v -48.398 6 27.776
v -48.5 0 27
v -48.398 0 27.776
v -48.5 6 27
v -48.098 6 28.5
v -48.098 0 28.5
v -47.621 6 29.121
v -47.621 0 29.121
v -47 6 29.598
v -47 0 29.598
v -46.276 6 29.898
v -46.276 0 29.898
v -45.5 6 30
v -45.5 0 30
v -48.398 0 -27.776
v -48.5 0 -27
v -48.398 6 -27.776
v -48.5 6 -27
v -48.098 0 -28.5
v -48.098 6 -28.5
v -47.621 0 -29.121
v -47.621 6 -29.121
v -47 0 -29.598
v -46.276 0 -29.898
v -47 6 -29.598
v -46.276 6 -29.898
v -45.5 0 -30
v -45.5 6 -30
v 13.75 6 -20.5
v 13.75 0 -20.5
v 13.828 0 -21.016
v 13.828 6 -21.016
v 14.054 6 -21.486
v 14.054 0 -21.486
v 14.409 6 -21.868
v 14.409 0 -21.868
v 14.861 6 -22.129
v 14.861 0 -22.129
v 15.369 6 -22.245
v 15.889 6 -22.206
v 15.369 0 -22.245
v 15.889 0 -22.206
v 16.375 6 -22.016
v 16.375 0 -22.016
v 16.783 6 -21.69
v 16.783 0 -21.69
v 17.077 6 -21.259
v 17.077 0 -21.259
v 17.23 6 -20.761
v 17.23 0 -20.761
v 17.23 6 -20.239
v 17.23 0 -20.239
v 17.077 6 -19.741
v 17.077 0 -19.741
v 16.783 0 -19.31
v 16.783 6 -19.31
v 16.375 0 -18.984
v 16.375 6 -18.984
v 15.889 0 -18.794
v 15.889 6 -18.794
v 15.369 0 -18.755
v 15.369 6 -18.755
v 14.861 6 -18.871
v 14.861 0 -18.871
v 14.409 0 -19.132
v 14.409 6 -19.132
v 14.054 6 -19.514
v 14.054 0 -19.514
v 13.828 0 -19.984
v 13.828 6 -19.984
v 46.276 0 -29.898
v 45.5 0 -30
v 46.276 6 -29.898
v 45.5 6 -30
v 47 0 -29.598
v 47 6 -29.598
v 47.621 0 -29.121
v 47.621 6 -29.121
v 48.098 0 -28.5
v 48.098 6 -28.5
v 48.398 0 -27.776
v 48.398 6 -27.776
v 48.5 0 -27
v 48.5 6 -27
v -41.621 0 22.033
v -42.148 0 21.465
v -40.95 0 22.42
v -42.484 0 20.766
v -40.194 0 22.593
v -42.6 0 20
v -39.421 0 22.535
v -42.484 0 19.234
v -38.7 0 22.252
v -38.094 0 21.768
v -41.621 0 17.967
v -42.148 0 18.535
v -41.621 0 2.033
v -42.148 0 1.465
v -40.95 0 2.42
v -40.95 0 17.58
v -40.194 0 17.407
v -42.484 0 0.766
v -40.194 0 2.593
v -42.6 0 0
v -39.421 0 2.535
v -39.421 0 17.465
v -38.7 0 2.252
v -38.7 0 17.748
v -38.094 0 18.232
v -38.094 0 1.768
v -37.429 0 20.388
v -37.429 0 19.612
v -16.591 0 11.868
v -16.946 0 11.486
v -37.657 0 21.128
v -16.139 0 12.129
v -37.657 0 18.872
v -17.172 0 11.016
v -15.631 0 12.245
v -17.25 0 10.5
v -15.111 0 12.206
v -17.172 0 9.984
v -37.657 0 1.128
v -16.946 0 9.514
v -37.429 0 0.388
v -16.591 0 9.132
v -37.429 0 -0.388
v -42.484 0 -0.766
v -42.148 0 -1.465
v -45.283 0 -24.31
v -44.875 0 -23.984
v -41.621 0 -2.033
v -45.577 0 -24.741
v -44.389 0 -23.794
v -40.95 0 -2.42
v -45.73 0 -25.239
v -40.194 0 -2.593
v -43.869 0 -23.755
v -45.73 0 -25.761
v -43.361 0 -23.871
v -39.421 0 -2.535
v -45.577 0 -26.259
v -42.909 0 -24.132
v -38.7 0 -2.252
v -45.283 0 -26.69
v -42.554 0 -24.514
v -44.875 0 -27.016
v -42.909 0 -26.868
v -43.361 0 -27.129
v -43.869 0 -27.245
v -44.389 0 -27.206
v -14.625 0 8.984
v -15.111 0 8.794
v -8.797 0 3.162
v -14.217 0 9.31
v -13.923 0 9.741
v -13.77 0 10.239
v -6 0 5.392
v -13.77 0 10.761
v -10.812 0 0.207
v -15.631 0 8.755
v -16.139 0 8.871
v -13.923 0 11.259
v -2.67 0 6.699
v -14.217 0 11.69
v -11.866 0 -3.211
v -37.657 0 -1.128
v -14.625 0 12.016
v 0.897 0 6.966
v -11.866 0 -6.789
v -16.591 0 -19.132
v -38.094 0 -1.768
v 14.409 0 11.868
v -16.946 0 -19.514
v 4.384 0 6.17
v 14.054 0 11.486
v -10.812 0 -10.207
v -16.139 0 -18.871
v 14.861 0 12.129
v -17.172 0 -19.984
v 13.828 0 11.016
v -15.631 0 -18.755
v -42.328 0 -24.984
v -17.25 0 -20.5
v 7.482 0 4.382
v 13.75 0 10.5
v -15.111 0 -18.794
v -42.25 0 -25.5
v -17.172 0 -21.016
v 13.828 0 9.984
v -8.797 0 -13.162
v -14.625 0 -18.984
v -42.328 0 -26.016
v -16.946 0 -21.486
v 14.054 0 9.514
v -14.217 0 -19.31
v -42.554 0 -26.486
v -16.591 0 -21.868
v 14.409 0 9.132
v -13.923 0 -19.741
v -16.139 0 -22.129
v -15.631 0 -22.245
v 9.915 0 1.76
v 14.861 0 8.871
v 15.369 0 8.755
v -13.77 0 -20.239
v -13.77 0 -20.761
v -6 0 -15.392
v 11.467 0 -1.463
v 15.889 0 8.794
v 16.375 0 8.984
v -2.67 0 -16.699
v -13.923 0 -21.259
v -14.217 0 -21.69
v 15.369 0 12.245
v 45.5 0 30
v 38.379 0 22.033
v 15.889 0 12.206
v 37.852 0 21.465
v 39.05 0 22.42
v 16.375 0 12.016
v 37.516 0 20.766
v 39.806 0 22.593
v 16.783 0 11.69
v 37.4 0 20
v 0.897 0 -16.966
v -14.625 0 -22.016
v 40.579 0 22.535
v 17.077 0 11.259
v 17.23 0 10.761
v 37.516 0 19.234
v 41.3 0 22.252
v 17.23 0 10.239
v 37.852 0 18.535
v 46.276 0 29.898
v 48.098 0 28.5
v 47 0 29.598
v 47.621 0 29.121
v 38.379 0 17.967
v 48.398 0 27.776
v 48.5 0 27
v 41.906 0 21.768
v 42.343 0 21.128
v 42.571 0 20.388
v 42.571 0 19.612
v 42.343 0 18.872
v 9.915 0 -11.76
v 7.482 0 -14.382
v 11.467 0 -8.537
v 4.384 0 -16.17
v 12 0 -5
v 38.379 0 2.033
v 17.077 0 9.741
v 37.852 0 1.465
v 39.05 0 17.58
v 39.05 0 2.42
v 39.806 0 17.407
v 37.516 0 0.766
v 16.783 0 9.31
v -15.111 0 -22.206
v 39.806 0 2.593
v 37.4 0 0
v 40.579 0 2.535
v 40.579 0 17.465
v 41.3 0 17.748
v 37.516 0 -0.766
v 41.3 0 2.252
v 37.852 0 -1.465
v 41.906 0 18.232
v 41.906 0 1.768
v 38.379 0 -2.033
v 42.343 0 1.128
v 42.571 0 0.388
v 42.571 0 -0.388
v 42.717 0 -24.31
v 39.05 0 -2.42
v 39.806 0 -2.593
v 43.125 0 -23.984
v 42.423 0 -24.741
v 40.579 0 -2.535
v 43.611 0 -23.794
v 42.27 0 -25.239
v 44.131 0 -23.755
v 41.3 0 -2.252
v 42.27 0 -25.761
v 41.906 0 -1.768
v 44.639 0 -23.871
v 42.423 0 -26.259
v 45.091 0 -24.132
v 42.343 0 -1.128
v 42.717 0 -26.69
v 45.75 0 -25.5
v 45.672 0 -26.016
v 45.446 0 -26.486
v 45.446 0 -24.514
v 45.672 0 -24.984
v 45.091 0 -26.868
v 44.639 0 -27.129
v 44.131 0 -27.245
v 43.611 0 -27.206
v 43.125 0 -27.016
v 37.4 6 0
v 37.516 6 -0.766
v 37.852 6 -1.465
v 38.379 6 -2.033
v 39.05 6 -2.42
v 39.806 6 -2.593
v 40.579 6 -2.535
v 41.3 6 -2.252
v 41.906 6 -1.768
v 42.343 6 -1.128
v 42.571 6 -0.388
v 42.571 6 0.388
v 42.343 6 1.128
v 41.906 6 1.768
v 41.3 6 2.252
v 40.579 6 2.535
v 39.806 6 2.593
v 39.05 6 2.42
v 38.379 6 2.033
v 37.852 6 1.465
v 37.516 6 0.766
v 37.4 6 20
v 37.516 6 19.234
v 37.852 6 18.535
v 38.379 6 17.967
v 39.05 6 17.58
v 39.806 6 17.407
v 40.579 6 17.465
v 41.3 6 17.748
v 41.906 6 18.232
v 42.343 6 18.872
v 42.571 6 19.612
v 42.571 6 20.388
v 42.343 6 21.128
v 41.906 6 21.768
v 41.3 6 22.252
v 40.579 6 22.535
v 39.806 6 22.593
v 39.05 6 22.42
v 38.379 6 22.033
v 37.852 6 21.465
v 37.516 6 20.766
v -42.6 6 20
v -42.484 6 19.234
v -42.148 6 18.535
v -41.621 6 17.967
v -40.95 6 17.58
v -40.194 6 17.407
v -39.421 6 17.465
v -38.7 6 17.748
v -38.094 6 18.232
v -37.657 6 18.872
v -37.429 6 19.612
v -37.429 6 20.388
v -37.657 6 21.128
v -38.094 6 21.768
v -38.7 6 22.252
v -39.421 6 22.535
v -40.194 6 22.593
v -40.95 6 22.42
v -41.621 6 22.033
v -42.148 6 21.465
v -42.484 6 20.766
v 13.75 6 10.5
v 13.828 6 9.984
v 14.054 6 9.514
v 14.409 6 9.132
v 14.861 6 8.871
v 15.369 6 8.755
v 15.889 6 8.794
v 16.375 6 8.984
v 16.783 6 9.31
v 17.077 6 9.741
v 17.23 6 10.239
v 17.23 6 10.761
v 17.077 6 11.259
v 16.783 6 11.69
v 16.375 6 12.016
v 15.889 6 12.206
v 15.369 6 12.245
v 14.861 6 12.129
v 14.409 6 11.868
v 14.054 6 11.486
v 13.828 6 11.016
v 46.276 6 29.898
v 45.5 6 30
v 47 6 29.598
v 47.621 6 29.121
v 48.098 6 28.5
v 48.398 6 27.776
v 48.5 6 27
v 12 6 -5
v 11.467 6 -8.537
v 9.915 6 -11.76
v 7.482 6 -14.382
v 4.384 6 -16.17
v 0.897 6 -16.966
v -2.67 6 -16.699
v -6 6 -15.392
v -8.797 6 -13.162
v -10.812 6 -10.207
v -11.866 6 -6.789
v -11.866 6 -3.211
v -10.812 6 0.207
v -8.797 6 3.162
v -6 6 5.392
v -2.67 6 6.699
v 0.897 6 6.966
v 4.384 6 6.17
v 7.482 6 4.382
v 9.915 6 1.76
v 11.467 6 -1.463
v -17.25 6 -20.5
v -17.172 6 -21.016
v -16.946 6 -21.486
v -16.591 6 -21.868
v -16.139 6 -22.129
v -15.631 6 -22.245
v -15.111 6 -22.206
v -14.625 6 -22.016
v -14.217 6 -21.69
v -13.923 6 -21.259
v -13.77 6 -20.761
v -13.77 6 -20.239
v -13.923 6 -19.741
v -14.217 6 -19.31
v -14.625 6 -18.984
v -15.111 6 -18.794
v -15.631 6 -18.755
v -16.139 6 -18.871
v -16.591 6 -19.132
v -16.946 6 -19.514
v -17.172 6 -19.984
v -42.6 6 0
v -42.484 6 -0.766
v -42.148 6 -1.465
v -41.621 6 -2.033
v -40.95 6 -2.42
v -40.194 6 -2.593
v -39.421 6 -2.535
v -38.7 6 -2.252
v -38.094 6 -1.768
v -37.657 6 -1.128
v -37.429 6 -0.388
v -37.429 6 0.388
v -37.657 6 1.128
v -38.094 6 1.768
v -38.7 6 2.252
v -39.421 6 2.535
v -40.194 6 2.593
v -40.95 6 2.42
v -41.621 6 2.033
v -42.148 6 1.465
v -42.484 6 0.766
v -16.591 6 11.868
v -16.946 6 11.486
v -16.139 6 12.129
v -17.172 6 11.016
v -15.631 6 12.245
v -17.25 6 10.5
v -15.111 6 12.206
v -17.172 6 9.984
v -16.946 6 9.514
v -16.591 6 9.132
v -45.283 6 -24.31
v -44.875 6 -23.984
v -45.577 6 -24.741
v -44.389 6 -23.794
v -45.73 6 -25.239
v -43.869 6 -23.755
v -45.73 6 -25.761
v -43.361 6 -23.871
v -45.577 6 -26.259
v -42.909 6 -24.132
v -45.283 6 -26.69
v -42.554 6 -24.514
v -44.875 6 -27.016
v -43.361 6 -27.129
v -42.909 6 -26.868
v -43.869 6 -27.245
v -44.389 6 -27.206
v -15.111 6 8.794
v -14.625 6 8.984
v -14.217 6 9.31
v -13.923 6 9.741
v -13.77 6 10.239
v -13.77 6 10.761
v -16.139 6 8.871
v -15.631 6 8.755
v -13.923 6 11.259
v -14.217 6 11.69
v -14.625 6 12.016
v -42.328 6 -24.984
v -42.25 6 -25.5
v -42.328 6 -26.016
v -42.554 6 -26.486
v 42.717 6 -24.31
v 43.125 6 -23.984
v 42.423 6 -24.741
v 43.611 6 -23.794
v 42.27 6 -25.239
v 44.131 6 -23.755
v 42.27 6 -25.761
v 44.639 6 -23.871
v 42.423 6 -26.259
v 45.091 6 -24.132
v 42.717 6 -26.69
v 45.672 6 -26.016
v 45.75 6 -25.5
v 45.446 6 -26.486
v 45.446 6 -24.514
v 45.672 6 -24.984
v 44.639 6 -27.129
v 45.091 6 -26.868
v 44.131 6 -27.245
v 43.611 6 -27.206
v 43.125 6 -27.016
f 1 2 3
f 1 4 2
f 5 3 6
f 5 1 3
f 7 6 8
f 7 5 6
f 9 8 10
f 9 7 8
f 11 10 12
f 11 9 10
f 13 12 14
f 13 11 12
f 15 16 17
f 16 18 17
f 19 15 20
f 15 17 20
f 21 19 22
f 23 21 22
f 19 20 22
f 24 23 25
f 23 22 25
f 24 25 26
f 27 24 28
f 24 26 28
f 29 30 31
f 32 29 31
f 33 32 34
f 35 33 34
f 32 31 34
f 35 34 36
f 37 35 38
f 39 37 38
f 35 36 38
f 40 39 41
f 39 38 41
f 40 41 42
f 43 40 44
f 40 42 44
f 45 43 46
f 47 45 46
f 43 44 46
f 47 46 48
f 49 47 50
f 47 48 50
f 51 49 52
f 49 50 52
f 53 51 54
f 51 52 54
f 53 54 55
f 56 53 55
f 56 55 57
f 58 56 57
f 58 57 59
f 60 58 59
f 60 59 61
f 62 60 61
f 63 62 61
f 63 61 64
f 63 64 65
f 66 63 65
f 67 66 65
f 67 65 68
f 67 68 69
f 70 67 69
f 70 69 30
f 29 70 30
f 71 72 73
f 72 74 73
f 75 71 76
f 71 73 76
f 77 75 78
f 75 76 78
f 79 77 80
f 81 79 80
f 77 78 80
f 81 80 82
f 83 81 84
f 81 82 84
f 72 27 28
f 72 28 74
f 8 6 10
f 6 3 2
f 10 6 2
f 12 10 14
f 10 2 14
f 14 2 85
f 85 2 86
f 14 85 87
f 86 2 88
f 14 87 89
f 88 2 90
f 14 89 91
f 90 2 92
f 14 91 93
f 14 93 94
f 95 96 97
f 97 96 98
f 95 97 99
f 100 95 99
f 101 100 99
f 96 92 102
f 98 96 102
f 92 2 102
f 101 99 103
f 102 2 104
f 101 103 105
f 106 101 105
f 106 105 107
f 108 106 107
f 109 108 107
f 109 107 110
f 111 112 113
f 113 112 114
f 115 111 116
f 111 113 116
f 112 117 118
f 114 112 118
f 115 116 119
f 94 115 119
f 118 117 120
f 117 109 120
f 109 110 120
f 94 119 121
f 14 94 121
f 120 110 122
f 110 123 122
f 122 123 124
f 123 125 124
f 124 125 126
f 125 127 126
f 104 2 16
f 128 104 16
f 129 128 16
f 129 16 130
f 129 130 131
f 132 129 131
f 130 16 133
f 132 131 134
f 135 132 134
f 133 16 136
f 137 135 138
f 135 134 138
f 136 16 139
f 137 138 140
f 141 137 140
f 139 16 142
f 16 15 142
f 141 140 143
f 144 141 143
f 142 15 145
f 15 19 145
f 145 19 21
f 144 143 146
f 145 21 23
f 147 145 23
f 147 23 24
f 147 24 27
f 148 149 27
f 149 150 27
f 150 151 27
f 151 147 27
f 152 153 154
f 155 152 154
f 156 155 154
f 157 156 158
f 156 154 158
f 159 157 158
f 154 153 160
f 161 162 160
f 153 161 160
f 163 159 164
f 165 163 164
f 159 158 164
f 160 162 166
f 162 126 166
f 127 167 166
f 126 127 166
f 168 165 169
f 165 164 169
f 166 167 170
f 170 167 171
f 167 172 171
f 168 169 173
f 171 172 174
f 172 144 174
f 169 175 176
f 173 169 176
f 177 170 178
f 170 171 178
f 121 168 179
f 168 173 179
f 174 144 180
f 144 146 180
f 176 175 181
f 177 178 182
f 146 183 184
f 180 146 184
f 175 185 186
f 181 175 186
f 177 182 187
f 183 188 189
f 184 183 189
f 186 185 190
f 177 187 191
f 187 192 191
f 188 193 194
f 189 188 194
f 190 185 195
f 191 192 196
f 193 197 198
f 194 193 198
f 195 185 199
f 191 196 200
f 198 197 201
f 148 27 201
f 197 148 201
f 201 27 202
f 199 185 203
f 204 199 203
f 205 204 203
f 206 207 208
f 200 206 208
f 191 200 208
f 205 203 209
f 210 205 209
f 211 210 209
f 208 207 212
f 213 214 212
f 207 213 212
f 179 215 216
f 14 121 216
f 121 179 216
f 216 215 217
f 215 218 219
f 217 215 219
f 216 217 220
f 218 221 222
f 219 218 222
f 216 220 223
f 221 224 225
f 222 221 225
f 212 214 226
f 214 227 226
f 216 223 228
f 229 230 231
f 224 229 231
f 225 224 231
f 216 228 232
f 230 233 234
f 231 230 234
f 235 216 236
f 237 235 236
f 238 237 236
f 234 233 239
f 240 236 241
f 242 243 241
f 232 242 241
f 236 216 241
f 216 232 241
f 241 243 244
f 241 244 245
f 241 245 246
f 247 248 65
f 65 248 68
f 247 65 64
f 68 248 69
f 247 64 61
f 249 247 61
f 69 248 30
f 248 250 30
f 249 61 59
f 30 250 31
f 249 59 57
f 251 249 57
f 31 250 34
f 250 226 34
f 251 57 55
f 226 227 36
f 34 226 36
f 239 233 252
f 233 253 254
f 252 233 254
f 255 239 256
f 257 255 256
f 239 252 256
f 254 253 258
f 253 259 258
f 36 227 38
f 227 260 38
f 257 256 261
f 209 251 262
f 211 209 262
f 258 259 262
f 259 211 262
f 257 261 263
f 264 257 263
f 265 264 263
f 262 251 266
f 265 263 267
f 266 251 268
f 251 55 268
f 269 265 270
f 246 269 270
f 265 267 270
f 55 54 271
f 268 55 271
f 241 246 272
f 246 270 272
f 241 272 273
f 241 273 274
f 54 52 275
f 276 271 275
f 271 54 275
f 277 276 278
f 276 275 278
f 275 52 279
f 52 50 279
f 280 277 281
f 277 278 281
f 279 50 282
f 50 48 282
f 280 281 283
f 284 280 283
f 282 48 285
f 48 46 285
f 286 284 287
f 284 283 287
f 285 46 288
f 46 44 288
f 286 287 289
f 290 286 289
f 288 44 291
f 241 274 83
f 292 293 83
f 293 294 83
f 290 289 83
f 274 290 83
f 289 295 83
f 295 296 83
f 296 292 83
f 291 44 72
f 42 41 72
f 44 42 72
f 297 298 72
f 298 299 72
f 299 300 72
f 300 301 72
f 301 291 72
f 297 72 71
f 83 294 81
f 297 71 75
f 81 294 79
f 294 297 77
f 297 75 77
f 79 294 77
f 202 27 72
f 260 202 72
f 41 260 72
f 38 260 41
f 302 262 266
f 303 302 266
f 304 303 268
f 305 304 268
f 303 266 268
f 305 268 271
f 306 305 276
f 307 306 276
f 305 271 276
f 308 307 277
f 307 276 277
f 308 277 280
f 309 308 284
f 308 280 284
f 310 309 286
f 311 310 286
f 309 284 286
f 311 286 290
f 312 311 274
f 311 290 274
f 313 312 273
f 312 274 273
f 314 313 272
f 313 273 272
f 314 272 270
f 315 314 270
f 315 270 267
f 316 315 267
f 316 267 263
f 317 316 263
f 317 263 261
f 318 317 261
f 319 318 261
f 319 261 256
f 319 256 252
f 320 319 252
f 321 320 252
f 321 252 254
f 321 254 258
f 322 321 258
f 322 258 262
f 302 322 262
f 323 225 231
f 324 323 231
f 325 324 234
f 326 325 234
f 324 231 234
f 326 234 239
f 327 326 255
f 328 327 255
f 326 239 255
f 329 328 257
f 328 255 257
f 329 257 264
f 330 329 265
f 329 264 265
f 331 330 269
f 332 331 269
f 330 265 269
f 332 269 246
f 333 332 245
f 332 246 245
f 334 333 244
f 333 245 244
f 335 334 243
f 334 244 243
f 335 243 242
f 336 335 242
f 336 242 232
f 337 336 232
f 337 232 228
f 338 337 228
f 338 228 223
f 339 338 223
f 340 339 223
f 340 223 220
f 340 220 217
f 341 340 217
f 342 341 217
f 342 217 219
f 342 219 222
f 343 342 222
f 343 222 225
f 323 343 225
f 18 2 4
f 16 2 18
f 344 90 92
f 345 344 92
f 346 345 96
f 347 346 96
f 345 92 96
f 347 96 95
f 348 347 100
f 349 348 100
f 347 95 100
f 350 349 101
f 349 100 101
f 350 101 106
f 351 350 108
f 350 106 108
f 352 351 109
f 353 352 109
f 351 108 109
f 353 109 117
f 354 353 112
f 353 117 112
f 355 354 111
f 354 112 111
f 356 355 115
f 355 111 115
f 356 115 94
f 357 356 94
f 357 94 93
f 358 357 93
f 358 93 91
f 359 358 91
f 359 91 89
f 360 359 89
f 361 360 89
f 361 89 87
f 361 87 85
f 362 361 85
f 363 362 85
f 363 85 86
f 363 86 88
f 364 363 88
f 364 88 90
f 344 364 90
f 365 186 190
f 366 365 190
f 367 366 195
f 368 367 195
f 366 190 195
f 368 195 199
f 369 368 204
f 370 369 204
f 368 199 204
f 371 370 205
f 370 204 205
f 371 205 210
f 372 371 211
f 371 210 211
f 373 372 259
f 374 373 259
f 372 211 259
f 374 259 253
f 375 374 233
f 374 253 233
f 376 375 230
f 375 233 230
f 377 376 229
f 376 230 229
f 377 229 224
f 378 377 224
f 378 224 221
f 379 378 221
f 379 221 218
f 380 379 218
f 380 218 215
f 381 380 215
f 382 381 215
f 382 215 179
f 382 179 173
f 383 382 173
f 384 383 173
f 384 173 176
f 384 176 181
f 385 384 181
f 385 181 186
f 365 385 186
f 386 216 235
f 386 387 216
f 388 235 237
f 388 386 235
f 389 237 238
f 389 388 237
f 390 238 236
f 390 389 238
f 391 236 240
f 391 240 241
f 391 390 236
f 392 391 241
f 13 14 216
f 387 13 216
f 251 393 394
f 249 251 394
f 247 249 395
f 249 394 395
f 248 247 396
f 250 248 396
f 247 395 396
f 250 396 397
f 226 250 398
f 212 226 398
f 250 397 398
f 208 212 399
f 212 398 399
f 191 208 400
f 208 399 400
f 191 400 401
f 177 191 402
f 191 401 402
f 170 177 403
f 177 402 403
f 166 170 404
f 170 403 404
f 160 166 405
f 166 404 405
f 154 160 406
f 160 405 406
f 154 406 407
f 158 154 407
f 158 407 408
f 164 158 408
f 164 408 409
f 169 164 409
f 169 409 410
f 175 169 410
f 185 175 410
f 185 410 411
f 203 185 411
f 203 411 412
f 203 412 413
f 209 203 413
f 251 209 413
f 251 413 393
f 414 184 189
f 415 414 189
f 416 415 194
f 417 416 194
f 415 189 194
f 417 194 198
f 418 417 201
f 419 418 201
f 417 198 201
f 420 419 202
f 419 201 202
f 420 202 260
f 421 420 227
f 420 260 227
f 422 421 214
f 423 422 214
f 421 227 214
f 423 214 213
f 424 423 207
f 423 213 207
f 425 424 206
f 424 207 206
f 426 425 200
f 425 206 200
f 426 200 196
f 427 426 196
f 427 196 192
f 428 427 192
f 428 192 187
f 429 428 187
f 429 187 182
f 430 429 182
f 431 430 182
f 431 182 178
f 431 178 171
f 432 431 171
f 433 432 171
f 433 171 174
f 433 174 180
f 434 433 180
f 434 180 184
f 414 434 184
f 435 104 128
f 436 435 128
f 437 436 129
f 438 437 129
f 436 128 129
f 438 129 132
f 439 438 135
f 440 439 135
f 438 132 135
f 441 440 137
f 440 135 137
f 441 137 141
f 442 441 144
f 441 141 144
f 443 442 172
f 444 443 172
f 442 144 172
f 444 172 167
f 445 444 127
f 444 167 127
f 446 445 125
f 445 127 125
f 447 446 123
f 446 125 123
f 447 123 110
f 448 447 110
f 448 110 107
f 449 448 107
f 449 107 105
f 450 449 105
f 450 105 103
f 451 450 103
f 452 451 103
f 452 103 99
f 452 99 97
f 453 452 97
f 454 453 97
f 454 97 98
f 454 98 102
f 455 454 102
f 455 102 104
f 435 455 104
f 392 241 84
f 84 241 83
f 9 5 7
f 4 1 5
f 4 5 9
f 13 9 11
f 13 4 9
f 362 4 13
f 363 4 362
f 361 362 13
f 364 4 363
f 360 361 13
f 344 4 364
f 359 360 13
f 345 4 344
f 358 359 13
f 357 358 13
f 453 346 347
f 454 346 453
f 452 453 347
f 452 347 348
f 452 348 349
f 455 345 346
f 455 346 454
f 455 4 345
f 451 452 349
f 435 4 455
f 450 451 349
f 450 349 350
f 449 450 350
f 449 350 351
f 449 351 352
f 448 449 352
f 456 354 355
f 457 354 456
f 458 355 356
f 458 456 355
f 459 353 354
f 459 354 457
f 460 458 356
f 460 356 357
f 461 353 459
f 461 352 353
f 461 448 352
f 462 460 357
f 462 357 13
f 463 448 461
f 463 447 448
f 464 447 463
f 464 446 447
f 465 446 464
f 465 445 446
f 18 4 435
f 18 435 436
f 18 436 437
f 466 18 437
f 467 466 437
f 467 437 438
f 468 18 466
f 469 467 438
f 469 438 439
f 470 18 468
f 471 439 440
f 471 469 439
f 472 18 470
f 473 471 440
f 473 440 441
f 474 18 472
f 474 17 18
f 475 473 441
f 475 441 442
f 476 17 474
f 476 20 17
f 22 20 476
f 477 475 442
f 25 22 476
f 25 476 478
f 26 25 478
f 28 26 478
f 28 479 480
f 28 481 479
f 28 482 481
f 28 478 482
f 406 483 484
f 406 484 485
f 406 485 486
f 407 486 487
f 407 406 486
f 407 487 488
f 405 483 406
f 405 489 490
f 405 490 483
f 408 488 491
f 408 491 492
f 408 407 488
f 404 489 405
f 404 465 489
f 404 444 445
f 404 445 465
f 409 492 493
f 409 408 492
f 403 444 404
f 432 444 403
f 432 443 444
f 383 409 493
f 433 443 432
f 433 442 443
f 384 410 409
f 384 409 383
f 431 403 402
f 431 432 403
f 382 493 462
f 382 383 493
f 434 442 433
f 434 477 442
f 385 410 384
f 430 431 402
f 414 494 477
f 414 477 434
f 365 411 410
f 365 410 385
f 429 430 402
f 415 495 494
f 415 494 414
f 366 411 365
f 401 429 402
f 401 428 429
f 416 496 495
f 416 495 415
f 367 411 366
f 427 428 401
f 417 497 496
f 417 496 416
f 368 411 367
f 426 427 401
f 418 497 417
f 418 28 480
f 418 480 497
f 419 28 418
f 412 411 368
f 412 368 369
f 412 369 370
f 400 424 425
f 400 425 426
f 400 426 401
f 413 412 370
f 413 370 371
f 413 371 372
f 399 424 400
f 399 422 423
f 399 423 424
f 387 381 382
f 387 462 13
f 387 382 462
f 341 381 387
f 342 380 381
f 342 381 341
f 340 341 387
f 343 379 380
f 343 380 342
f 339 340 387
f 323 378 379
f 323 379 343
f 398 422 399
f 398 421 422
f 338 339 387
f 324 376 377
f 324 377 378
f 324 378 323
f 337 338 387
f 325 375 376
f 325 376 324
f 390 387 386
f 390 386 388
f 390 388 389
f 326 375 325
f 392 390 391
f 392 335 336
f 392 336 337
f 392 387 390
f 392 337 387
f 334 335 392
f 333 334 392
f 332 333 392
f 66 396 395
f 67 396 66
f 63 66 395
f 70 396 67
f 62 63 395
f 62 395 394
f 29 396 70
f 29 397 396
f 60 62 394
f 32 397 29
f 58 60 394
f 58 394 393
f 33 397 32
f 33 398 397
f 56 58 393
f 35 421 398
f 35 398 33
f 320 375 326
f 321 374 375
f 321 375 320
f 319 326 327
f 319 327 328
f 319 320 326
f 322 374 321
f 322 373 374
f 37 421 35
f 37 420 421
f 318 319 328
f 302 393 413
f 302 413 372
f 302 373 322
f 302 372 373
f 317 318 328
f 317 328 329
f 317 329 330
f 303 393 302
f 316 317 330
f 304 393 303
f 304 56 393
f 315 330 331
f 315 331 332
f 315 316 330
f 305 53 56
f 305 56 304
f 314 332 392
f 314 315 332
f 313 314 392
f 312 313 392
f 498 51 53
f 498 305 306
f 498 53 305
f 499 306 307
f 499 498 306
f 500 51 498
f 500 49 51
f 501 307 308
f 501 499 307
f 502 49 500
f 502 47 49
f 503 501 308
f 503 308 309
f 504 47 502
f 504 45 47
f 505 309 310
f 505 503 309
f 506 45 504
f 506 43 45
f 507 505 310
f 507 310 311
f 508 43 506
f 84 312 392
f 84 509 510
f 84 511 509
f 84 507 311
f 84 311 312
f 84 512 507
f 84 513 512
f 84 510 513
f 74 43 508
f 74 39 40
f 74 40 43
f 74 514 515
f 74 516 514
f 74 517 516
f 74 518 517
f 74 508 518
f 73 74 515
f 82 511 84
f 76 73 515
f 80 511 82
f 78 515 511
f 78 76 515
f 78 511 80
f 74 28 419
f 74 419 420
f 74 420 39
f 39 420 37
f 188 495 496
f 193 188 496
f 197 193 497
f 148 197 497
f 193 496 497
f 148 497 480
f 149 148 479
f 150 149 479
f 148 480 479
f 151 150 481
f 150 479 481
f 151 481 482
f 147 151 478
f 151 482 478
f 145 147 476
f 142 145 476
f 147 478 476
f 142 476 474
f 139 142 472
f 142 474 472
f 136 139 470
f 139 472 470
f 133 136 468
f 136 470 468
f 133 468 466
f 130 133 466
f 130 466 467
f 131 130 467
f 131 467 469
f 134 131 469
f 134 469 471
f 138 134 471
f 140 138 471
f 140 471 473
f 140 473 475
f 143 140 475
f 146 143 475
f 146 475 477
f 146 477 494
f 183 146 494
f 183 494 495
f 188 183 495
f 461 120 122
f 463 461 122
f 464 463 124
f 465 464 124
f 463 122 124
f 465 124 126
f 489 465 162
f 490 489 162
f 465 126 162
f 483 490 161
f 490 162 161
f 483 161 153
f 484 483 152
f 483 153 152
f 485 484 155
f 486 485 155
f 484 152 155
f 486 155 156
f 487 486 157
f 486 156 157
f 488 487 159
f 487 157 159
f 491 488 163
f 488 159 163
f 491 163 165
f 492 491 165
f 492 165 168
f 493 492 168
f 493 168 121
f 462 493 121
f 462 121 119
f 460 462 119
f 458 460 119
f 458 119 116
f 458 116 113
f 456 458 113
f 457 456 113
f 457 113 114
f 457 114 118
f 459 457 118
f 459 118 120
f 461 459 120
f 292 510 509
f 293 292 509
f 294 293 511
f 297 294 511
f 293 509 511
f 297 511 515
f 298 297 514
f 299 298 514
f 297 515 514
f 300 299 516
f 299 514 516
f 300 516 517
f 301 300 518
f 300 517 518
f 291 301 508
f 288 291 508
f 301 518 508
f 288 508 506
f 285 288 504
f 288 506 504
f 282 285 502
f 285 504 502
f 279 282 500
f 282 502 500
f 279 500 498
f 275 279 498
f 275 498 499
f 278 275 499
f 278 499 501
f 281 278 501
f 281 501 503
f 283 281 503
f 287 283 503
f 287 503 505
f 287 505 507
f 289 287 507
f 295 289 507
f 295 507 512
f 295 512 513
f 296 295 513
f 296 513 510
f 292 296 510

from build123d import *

# Parameters (mm, degrees)
SKETCH1_W                     = 97
SKETCH1_H                     = 60
BASE_DEPTH                    = 6
SKETCH2_R                     = 12
STEPPERCASEHOLE_DEPTH         = 7
FILLETEDGES3MM_R              = 3
F_3_5MM_CABLETIEHOLES_D       = 3.5
F_5_2_5_2_HOLESFORCORNERS_D   = 5.2
F_3_5_3_5_STEPPERMOUNTHOLES_D = 3.5


with BuildPart() as part:
    # Sketch1 → Base (new body)
    with BuildSketch(Plane(origin=(0, 0, 0), x_dir=(1, 0, 0), z_dir=(0, 1, 0))):
        Rectangle(SKETCH1_W, SKETCH1_H)
    extrude(amount=BASE_DEPTH)

    # Sketch2 → StepperCaseHole (cut, through all)
    with BuildSketch(Plane(origin=(0, 6, 0), x_dir=(1, 0, 0), z_dir=(0, 1, 0))):
        with Locations((0, 5)):
            Circle(SKETCH2_R)
    extrude(amount=-STEPPERCASEHOLE_DEPTH, mode=Mode.SUBTRACT)

    # FilletEdges3mm
    filletedges3mm_edges = [part.edges().sort_by_distance(p)[0] for p in [
        (-48.5, 3, -30),
        (48.5, 3, -30),
        (48.5, 3, 30),
        (-48.5, 3, 30),
    ]]
    fillet(filletedges3mm_edges, radius=FILLETEDGES3MM_R)

    # Ø3.5mm CableTieHoles (through all)
    with Locations(Plane(origin=(0, 0, 0), x_dir=(-1, 0, 0), z_dir=(0, -1, 0))):
        with Locations((-44, 25.5), (44, 25.5)):
            Hole(F_3_5MM_CABLETIEHOLES_D / 2)

    # Ø5.2 (5.2) HolesForCorners (through all)
    with Locations(Plane(origin=(0, 6, 0), x_dir=(1, 0, 0), z_dir=(0, 1, 0))):
        with Locations((-40, 0), (-40, -20), (40, 0), (40, -20)):
            Hole(F_5_2_5_2_HOLESFORCORNERS_D / 2)

    # Ø3.5 (3.5) StepperMountHoles (through all)
    with Locations(Plane(origin=(0, 6, 0), x_dir=(1, 0, 0), z_dir=(0, 1, 0))):
        with Locations((-15.5, 20.5), (-15.5, -10.5), (15.5, -10.5), (15.5, 20.5)):
            Hole(F_3_5_3_5_STEPPERMOUNTHOLES_D / 2)


solid = part.part
